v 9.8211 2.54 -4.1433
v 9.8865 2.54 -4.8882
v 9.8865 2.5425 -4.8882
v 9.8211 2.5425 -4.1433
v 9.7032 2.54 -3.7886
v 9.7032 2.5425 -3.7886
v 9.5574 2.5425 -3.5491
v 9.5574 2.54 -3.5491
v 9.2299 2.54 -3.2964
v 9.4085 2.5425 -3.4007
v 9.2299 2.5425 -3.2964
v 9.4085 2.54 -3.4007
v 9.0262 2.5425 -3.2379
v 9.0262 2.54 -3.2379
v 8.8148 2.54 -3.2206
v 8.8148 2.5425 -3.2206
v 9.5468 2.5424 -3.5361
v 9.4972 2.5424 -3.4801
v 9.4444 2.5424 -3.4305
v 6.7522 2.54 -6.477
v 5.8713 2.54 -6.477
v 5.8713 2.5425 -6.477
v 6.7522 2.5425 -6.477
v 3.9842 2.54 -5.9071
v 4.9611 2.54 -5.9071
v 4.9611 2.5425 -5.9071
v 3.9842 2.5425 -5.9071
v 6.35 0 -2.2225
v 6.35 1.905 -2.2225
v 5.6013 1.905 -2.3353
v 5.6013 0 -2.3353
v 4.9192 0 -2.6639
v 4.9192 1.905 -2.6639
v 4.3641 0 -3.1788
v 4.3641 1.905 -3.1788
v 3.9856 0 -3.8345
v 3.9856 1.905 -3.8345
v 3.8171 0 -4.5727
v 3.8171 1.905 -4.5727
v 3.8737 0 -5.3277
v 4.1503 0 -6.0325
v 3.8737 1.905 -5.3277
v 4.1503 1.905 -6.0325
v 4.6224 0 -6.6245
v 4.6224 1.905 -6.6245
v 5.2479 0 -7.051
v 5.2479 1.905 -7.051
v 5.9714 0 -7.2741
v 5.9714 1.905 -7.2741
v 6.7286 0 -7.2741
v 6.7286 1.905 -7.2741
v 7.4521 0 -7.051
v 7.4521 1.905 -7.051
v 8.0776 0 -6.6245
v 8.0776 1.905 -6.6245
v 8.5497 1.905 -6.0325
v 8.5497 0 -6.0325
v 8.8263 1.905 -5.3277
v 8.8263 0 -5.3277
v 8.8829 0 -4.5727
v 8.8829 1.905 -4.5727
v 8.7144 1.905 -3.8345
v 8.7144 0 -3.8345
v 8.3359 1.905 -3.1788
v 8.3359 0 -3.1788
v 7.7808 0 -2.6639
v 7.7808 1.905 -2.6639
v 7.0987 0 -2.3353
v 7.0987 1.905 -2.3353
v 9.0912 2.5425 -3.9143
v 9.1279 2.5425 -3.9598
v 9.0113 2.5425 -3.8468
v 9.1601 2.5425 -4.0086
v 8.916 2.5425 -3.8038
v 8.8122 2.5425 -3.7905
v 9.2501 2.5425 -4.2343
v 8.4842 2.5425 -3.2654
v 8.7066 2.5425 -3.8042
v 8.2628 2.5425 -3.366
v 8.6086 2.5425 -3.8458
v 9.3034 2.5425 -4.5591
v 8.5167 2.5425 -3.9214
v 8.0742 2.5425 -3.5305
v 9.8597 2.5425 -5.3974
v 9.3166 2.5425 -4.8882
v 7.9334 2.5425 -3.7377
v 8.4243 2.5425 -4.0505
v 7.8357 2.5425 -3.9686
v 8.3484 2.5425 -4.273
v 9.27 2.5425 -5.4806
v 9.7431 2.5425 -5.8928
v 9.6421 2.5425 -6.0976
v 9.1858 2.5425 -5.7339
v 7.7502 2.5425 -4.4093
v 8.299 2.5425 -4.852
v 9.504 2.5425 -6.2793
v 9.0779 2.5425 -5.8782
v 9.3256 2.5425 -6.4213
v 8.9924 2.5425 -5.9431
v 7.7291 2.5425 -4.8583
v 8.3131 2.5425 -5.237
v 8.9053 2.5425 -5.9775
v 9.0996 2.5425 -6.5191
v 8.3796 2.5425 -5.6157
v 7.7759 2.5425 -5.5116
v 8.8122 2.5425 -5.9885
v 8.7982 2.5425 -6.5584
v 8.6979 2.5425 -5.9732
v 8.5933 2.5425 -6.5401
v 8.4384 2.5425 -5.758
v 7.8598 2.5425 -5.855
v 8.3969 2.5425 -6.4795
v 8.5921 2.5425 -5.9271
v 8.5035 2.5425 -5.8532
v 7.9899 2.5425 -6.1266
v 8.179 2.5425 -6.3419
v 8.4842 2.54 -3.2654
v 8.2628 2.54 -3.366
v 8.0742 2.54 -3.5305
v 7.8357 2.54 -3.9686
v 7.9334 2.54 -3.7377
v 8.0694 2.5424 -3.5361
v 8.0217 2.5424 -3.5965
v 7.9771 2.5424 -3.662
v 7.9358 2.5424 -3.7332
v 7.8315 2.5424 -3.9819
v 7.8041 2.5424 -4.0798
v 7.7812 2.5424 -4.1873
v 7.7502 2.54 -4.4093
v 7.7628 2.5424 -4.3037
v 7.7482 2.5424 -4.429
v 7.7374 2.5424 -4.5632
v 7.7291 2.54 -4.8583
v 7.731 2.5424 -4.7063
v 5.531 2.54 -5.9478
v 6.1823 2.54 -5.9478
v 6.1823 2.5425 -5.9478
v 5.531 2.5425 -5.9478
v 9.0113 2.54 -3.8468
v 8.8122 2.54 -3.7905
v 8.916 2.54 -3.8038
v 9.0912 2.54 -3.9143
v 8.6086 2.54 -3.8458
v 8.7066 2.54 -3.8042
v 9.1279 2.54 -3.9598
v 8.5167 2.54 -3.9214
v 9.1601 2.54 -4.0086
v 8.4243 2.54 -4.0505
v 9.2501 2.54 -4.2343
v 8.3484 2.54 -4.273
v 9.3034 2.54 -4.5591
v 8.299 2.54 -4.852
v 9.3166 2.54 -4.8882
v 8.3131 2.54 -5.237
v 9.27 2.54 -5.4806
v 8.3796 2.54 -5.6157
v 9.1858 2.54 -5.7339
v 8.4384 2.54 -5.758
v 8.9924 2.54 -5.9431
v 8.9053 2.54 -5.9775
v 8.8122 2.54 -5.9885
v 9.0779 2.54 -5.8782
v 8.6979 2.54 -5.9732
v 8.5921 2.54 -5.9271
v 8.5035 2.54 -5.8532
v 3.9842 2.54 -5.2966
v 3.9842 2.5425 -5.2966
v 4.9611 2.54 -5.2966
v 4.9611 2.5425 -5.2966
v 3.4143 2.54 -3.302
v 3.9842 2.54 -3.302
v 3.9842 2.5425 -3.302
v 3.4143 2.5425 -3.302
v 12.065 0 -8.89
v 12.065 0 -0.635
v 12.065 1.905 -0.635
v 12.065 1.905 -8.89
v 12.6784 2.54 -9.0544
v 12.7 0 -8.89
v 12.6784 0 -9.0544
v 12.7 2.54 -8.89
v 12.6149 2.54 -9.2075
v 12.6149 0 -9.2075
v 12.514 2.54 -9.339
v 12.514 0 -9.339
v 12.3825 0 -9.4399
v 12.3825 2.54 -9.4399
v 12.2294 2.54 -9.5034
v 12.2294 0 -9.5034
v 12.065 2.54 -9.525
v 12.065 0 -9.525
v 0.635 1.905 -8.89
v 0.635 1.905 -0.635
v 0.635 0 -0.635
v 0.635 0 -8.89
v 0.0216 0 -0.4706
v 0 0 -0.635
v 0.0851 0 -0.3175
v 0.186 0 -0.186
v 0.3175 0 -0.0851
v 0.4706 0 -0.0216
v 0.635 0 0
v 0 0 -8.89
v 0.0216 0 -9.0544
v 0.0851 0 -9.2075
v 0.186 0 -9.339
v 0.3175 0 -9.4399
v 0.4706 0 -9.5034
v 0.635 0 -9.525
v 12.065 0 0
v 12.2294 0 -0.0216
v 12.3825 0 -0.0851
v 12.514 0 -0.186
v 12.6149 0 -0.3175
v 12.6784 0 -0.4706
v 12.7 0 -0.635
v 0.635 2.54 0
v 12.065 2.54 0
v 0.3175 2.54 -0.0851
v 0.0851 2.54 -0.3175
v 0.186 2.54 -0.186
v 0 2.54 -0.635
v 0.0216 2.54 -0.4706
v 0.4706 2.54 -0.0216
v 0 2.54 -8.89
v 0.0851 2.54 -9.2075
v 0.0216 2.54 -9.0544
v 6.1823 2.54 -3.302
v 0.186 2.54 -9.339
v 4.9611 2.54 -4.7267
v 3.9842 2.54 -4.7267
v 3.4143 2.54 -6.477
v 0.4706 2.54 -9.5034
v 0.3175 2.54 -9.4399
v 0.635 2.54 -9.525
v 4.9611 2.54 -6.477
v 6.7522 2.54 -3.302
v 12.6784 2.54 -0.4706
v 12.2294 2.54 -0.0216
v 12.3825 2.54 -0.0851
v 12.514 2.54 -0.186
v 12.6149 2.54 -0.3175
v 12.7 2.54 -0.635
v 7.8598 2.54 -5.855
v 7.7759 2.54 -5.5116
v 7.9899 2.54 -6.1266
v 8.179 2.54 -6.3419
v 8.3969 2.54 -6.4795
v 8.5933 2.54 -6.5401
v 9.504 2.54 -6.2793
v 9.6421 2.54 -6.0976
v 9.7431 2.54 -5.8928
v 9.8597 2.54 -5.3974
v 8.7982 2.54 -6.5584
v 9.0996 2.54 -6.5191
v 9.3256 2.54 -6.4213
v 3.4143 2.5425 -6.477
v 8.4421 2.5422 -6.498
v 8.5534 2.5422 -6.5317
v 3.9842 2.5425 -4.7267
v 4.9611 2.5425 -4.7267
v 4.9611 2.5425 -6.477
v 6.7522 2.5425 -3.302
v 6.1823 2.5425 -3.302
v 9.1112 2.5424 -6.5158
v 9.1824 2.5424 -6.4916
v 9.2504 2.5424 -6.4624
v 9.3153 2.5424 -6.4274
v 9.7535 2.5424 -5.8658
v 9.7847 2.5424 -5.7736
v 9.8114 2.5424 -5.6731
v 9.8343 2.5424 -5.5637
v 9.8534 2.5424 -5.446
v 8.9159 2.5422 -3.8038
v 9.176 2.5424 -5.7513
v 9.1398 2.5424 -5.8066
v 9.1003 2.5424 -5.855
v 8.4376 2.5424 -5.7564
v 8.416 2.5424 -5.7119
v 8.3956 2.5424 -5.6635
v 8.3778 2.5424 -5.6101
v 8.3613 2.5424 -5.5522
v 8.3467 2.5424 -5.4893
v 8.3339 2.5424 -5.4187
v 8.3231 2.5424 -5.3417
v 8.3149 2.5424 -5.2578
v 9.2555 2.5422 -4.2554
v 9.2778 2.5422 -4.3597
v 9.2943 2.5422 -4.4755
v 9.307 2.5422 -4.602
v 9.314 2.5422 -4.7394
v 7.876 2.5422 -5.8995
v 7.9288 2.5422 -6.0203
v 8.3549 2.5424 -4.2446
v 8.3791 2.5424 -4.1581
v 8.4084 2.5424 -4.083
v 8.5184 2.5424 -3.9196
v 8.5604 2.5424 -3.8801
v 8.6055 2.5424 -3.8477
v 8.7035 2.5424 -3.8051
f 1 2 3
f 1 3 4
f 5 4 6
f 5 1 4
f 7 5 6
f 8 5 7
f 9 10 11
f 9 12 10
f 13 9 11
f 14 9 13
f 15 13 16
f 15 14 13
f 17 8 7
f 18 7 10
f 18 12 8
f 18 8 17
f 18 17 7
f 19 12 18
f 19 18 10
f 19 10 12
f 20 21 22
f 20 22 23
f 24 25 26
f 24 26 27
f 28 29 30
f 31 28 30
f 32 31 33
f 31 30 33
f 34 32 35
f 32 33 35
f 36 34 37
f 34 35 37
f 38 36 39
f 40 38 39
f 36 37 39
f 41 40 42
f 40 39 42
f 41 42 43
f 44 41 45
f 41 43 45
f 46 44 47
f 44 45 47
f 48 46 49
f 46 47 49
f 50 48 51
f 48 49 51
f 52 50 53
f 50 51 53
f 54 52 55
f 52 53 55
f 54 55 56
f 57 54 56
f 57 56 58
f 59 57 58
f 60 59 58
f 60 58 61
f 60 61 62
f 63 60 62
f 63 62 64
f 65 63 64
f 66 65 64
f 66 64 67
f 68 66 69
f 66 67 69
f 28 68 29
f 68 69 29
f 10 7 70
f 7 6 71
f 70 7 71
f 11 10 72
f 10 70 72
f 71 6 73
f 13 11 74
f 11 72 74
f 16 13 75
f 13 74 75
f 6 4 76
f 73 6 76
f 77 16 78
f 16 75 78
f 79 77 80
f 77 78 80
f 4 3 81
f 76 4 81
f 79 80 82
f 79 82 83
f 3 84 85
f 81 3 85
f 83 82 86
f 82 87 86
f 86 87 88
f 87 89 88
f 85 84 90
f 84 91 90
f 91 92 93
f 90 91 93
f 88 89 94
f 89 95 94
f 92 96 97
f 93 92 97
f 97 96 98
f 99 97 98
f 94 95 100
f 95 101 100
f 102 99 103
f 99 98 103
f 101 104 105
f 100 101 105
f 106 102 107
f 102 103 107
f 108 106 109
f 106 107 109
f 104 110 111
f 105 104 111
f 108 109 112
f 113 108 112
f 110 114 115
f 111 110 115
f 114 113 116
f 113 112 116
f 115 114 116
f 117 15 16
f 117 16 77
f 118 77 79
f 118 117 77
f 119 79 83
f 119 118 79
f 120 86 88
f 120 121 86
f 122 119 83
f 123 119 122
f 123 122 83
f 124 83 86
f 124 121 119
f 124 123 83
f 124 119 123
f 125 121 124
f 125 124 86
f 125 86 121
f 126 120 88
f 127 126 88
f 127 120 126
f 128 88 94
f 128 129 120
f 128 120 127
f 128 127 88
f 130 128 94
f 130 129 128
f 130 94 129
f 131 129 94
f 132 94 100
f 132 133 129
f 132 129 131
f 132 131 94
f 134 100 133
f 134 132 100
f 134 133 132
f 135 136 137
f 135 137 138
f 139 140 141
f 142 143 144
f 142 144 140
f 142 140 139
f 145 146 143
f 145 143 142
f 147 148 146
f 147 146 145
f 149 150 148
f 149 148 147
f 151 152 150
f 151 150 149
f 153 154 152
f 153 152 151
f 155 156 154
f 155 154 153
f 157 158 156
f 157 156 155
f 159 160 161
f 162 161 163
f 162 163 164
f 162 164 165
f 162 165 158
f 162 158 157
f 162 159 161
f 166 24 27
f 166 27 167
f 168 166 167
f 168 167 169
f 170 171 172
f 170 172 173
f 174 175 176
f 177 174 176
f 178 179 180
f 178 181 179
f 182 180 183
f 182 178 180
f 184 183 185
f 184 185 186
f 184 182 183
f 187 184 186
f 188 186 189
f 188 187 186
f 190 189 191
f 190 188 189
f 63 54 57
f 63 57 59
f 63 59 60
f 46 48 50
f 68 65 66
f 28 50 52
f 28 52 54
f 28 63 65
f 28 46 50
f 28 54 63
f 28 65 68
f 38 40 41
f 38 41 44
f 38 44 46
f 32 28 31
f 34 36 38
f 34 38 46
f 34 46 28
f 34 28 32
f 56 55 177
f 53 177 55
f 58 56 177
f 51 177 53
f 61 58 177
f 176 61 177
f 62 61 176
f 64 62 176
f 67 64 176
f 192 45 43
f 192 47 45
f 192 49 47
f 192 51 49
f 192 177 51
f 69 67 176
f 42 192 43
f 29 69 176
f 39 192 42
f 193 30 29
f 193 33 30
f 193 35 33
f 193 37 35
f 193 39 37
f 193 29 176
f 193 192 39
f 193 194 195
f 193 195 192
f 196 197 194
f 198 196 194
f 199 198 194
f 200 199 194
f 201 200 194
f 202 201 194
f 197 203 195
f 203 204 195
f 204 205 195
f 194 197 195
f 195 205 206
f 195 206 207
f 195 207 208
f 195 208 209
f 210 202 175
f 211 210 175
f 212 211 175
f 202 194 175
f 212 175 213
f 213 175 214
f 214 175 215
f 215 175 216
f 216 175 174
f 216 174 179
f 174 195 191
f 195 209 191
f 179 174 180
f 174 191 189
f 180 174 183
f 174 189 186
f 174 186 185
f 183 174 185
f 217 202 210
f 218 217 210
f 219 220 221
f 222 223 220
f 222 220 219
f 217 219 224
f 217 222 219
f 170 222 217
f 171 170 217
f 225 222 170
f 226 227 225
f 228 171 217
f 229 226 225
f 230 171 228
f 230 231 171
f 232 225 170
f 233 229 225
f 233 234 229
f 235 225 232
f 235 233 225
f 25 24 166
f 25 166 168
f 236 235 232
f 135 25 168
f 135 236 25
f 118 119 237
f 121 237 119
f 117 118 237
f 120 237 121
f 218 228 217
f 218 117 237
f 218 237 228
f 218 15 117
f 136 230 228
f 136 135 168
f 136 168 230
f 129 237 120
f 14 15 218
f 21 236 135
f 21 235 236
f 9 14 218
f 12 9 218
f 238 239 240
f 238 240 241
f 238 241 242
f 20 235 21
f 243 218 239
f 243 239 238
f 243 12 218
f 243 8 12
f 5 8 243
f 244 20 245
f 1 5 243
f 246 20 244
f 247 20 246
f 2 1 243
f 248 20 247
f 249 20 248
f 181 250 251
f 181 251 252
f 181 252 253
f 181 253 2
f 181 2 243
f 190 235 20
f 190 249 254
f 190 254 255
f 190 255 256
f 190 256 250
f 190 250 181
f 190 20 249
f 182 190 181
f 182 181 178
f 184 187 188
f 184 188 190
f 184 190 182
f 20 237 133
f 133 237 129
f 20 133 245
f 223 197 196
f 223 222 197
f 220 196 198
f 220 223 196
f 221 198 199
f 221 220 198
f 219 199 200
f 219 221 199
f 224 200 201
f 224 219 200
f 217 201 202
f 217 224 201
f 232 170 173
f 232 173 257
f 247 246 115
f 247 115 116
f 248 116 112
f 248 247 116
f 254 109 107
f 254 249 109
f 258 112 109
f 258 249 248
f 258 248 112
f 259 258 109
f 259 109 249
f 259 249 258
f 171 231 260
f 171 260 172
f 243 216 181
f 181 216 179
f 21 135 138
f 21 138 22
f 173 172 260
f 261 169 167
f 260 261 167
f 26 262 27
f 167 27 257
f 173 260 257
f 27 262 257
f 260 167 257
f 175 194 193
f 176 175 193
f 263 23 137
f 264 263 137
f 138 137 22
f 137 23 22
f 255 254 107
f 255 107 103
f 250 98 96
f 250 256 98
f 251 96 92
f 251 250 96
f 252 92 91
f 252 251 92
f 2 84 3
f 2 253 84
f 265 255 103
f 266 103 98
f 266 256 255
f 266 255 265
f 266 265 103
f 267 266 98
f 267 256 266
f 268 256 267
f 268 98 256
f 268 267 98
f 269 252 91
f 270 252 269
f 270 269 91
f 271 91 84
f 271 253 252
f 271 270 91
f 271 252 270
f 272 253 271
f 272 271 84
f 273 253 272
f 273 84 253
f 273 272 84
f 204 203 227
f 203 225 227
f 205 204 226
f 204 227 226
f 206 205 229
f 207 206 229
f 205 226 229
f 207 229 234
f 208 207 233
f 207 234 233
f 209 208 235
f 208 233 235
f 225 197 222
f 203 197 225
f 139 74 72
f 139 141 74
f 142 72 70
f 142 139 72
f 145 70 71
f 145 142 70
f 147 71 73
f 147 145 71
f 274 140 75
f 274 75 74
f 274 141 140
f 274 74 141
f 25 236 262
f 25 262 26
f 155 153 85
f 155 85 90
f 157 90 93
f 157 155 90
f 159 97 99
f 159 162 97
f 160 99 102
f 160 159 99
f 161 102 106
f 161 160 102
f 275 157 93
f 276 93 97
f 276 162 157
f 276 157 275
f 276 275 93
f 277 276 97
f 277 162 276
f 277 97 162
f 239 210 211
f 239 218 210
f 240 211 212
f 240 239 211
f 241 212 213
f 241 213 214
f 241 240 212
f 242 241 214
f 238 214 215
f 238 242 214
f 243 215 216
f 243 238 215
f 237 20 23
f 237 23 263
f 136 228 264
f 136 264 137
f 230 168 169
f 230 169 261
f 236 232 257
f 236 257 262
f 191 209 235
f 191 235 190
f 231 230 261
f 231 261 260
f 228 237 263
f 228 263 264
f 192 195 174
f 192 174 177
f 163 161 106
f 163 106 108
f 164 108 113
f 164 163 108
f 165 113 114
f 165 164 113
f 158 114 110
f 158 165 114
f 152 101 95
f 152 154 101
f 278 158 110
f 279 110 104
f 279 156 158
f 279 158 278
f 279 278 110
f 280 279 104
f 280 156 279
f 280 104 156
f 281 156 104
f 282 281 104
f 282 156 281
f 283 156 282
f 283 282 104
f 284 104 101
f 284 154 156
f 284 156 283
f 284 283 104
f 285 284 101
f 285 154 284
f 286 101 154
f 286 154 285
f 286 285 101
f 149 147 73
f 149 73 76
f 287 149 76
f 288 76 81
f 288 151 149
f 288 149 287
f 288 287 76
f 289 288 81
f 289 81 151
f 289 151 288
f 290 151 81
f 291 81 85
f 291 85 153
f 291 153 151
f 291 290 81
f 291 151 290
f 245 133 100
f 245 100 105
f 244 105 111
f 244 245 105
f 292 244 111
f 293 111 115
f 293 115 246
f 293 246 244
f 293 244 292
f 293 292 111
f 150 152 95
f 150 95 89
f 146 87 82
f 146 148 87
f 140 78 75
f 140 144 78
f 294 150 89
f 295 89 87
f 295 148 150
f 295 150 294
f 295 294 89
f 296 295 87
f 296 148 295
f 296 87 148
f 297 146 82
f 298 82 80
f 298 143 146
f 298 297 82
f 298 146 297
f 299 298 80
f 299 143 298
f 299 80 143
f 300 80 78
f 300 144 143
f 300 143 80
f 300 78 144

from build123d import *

# Parameters (mm, degrees)
SKETCH1_W           = 12.7
SKETCH1_H           = 9.525
BOSS_EXTRUDE1_DEPTH = 2.54
FILLET1_R           = 0.635
SHELL1_START        = 0.635
SHELL1_OUTLINE_W    = 1.905
SHELL1_OUTLINE_H    = 8.255
SHELL1_DEPTH        = 11.43
SKETCH2_R           = 2.54
BOSS_EXTRUDE2_DEPTH = 1.905
BOSS_EXTRUDE3_DEPTH = 0.00254


# Read off the part's stored shape, not the designer's step: Shell1
with BuildPart() as part:
    # Sketch1 → Boss-Extrude1 (new body)
    with BuildSketch(Plane(origin=(0, 0, 0), x_dir=(1, 0, 0), z_dir=(0, 1, 0))):
        with Locations((6.35, 4.7625)):
            Rectangle(SKETCH1_W, SKETCH1_H)
    extrude(amount=BOSS_EXTRUDE1_DEPTH)

    # Fillet1
    fillet1_edges = [part.edges().sort_by_distance(p)[0] for p in [
        (0, 1.27, -9.525),
        (12.7, 1.27, -9.525),
        (12.7, 1.27, 0),
        (0, 1.27, 0),
    ]]
    fillet(fillet1_edges, radius=FILLET1_R)

    # Shell1 outline → Shell1 (cut)
    with BuildSketch(Plane.YZ.offset(SHELL1_START)):
        with Locations((0.9525, -4.7625)):
            Rectangle(SHELL1_OUTLINE_W, SHELL1_OUTLINE_H)
    extrude(amount=SHELL1_DEPTH, mode=Mode.SUBTRACT)

    # Sketch2 → Boss-Extrude2 (add)
    with BuildSketch(Plane(origin=(0, 1.905, 0), x_dir=(-1, 0, 0), z_dir=(0, -1, 0))):
        with Locations(Location((-6.35, 4.7625, 0), (0, 0, 270))):
            Circle(SKETCH2_R)
    extrude(amount=BOSS_EXTRUDE2_DEPTH)

    # Sketch3 → Boss-Extrude3 (add)
    # profile 1 of 3: a face of its own
    with BuildSketch(Plane(origin=(0, 2.54, 0), x_dir=(1, 0, 0), z_dir=(0, 1, 0))):
        Polygon((3.414346154, 6.477), (4.961141026, 6.477), (4.961141026, 5.907128205), (3.984217949, 5.907128205), (3.984217949, 5.296551282), (4.961141026, 5.296551282), (4.961141026, 4.726679487), (3.984217949, 4.726679487), (3.984217949, 3.302), (3.414346154, 3.302), align=None)
    # profile 2 of 3: a face of its own
    with BuildSketch(Plane(origin=(0, 2.54, 0), x_dir=(1, 0, 0), z_dir=(0, 1, 0))):
        Polygon((5.871282252, 6.477), (6.752166667, 6.477), (6.752166667, 3.302), (6.182294872, 3.302), (6.182294872, 5.947833333), (5.531012821, 5.947833333), align=None)
    # profile 3 of 3: a face of its own
    with BuildSketch(Plane(origin=(0, 2.54, 0), x_dir=(1, 0, 0), z_dir=(0, 1, 0))):
        with BuildLine():
            add(Edge.make_bspline(
                [(8.798235377, 6.558410256), (8.825819537, 6.558000762), (8.880057365, 6.557195586), (8.959939478, 6.548474876), (9.036888038, 6.535300314), (9.111204078, 6.516926396), (9.182352664, 6.492609168), (9.25085163, 6.463501864), (9.31588564, 6.428077745), (9.378284086, 6.388064384), (9.438022931, 6.342763586), (9.493666394, 6.291118337), (9.546230643, 6.234316997), (9.594577855, 6.171500832), (9.639778695, 6.10324122), (9.68168464, 6.029527338), (9.719974889, 5.949998406), (9.755078585, 5.864510908), (9.786468421, 5.771783423), (9.812908041, 5.670752326), (9.83558444, 5.561394546), (9.85472492, 5.443437874), (9.869192029, 5.316725518), (9.878943152, 5.181341659), (9.885634834, 5.037547297), (9.886180963, 4.938905546), (9.886461538, 4.888227965)],
                knots=[0, 0, 0, 0, 0.879237366, 1.728815576, 2.559023295, 3.367336655, 4.166867292, 4.954216142, 5.737608147, 6.525189134, 7.316157332, 8.124696809, 8.942788509, 9.781158001, 10.649253743, 11.551476218, 12.482711956, 13.461909668, 14.496590415, 15.601789533, 16.789733467, 18.056700938, 19.410929216, 20.8549011, 22.384193279, 24, 24, 24, 24], degree=3))
            add(Edge.make_bspline(
                [(9.886461538, 4.888227965), (9.886158312, 4.83691635), (9.885569149, 4.737218804), (9.879221327, 4.592109226), (9.86829008, 4.455742398), (9.854201098, 4.32813243), (9.834903048, 4.20934671), (9.812302348, 4.099077662), (9.785445387, 3.997365257), (9.75302158, 3.904438674), (9.718130367, 3.818801041), (9.679735377, 3.739427172), (9.63850583, 3.666102077), (9.595387407, 3.59771955), (9.548016197, 3.53629547), (9.498697891, 3.4797411), (9.445285081, 3.430210667), (9.390026654, 3.385151595), (9.330898269, 3.346211514), (9.268509703, 3.312155161), (9.201748675, 3.284531414), (9.131832125, 3.260505754), (9.057568312, 3.243257923), (8.980137277, 3.229572336), (8.89866484, 3.222008841), (8.843195123, 3.221070539), (8.814771835, 3.220589744)],
                knots=[0, 0, 0, 0, 1.643780988, 3.193836972, 4.651895693, 6.025988579, 7.305620092, 8.505800249, 9.631074763, 10.672816429, 11.65661981, 12.592235626, 13.49536222, 14.350718032, 15.179365177, 15.97804903, 16.751647189, 17.51006938, 18.259804725, 19.016521909, 19.783502495, 20.571750527, 21.382245291, 22.22305063, 23.089471752, 24, 24, 24, 24], degree=3))
            add(Edge.make_bspline(
                [(8.814771835, 3.220589744), (8.786349314, 3.221079814), (8.730670013, 3.222039854), (8.648977266, 3.229516098), (8.571135886, 3.243313364), (8.496284527, 3.26063817), (8.424944142, 3.284478255), (8.356772657, 3.312928485), (8.292294252, 3.346772343), (8.231330396, 3.38580315), (8.174089237, 3.430560743), (8.119681247, 3.480566389), (8.068226781, 3.535693336), (8.020508587, 3.596559051), (7.975745182, 3.662351105), (7.934403375, 3.733820811), (7.896508012, 3.810864109), (7.86087372, 3.893588392), (7.82991203, 3.983774617), (7.802357564, 4.082228137), (7.779785671, 4.189769642), (7.761631843, 4.306364584), (7.747137838, 4.431765951), (7.736355964, 4.566034271), (7.729972884, 4.709232083), (7.729389899, 4.807659072), (7.729089744, 4.858335136)],
                knots=[0, 0, 0, 0, 0.917216111, 1.796812873, 2.643793957, 3.46689424, 4.273913431, 5.068098542, 5.848489301, 6.620921603, 7.401012384, 8.190319798, 9.003608147, 9.831726257, 10.68377682, 11.569763213, 12.493818149, 13.453288342, 14.474581811, 15.568529029, 16.750744269, 18.018426408, 19.375425659, 20.823733699, 22.36466933, 24, 24, 24, 24], degree=3))
            add(Edge.make_bspline(
                [(7.729089744, 4.858335136), (7.729633447, 4.928745538), (7.730682529, 5.064603314), (7.74397727, 5.2608783), (7.763490579, 5.442300526), (7.792151006, 5.608566515), (7.827589229, 5.760292069), (7.872969718, 5.896477699), (7.924632103, 6.019007839), (7.968655093, 6.091595432), (7.989856971, 6.126554287)],
                knots=[0, 0, 0, 0, 1.288568992, 2.486310467, 3.599230591, 4.627010532, 5.572937695, 6.447898582, 7.252493626, 8, 8, 8, 8], degree=3))
            add(Edge.make_bspline(
                [(7.989856971, 6.126554287), (8.014509505, 6.160897855), (8.062710067, 6.228046298), (8.146990098, 6.316199652), (8.237538017, 6.391592717), (8.336213628, 6.452519281), (8.441456335, 6.500565973), (8.5541697, 6.534500812), (8.673937491, 6.554272829), (8.756184031, 6.557010519), (8.798235377, 6.558410256)],
                knots=[0, 0, 0, 0, 1.058512271, 2.069600068, 3.047294572, 4.004278952, 4.967380941, 5.939006123, 6.946246673, 8, 8, 8, 8], degree=3))
        make_face()
        with BuildLine():
            add(Edge.make_bspline(
                [(8.812227764, 5.988538462), (8.787291455, 5.98735653), (8.738403051, 5.985039317), (8.667463648, 5.965369447), (8.600572221, 5.934988272), (8.549689698, 5.898429277), (8.511604636, 5.863383097), (8.48499433, 5.831667444), (8.459332884, 5.796275061), (8.436667403, 5.755608871), (8.415265272, 5.711130059), (8.394348939, 5.662636719), (8.377203038, 5.608937747), (8.360357645, 5.550947646), (8.345599509, 5.487063142), (8.333235426, 5.41676205), (8.322189206, 5.339587196), (8.314484335, 5.25548803), (8.307301083, 5.164552541), (8.302151788, 5.06657816), (8.299998997, 4.961591317), (8.29931469, 4.889288437), (8.298961538, 4.85197496)],
                knots=[0, 0, 0, 0, 1.076674018, 2.110852608, 3.161083442, 4.239746716, 4.804137807, 5.395870207, 6.026861976, 6.692161227, 7.405688833, 8.16177676, 8.973626916, 9.841385931, 10.773283133, 11.807421078, 12.927755683, 14.143907515, 15.458935494, 16.872852025, 18.386167141, 20, 20, 20, 20], degree=3))
            add(Edge.make_bspline(
                [(8.298961538, 4.85197496), (8.299542783, 4.803633547), (8.300657362, 4.710935302), (8.306495007, 4.577631999), (8.318196082, 4.45631526), (8.332749856, 4.346162875), (8.353191227, 4.247889213), (8.376710347, 4.160564514), (8.405754369, 4.085301955), (8.439320333, 4.02101307), (8.476496151, 3.96632265), (8.516852136, 3.919835547), (8.559014312, 3.879579908), (8.604298698, 3.846880749), (8.652597258, 3.821821621), (8.70350679, 3.803796899), (8.757059643, 3.792763217), (8.793732086, 3.7912332), (8.812227764, 3.790461538)],
                knots=[0, 0, 0, 0, 1.771748488, 3.397459088, 4.888034009, 6.237357457, 7.467047327, 8.564189669, 9.548206622, 10.417051504, 11.216568818, 11.965764335, 12.669334354, 13.348544111, 14.005342236, 14.656555988, 15.322436492, 16, 16, 16, 16], degree=3))
            add(Edge.make_bspline(
                [(8.812227764, 3.790461538), (8.83008873, 3.790989566), (8.86505828, 3.79202338), (8.916051715, 3.802635332), (8.96427473, 3.819888063), (9.009581726, 3.844293261), (9.052134759, 3.875328205), (9.091725856, 3.913129275), (9.128056429, 3.95807326), (9.149222786, 3.991428344), (9.160129407, 4.008615585)],
                knots=[0, 0, 0, 0, 0.992283464, 1.942767638, 2.88273346, 3.832339453, 4.79467288, 5.803907806, 6.868395428, 8, 8, 8, 8], degree=3))
            add(Edge.make_bspline(
                [(9.160129407, 4.008615585), (9.172970117, 4.0321014), (9.199896044, 4.08134925), (9.231054773, 4.164453161), (9.257282455, 4.258180636), (9.279856237, 4.362823366), (9.295295327, 4.478794074), (9.308591452, 4.60535738), (9.315004504, 4.743150605), (9.316047621, 4.838614248), (9.316589744, 4.888227965)],
                knots=[0, 0, 0, 0, 0.710965849, 1.490837728, 2.352621235, 3.297892224, 4.334225155, 5.461620853, 6.680770821, 8, 8, 8, 8], degree=3))
            add(Edge.make_bspline(
                [(9.316589744, 4.888227965), (9.316380334, 4.938272352), (9.315977255, 5.034599256), (9.30858193, 5.172887857), (9.298283374, 5.299191543), (9.283219561, 5.41322833), (9.263837227, 5.515275048), (9.239948427, 5.605325026), (9.211785309, 5.683555737), (9.178387208, 5.749889172), (9.141396735, 5.806263493), (9.10213022, 5.854628288), (9.060421626, 5.895920929), (9.016340704, 5.930296808), (8.968867186, 5.956562559), (8.918907879, 5.975108351), (8.866360361, 5.986327934), (8.830515514, 5.987791673), (8.812227764, 5.988538462)],
                knots=[0, 0, 0, 0, 1.793836731, 3.452829483, 4.963243077, 6.335886805, 7.574563692, 8.684454726, 9.672768357, 10.54971625, 11.340229787, 12.085688095, 12.778991901, 13.440269426, 14.083255152, 14.715733572, 15.344777694, 16, 16, 16, 16], degree=3))
        make_face(mode=Mode.SUBTRACT)
    extrude(amount=BOSS_EXTRUDE3_DEPTH)


solid = part.part
